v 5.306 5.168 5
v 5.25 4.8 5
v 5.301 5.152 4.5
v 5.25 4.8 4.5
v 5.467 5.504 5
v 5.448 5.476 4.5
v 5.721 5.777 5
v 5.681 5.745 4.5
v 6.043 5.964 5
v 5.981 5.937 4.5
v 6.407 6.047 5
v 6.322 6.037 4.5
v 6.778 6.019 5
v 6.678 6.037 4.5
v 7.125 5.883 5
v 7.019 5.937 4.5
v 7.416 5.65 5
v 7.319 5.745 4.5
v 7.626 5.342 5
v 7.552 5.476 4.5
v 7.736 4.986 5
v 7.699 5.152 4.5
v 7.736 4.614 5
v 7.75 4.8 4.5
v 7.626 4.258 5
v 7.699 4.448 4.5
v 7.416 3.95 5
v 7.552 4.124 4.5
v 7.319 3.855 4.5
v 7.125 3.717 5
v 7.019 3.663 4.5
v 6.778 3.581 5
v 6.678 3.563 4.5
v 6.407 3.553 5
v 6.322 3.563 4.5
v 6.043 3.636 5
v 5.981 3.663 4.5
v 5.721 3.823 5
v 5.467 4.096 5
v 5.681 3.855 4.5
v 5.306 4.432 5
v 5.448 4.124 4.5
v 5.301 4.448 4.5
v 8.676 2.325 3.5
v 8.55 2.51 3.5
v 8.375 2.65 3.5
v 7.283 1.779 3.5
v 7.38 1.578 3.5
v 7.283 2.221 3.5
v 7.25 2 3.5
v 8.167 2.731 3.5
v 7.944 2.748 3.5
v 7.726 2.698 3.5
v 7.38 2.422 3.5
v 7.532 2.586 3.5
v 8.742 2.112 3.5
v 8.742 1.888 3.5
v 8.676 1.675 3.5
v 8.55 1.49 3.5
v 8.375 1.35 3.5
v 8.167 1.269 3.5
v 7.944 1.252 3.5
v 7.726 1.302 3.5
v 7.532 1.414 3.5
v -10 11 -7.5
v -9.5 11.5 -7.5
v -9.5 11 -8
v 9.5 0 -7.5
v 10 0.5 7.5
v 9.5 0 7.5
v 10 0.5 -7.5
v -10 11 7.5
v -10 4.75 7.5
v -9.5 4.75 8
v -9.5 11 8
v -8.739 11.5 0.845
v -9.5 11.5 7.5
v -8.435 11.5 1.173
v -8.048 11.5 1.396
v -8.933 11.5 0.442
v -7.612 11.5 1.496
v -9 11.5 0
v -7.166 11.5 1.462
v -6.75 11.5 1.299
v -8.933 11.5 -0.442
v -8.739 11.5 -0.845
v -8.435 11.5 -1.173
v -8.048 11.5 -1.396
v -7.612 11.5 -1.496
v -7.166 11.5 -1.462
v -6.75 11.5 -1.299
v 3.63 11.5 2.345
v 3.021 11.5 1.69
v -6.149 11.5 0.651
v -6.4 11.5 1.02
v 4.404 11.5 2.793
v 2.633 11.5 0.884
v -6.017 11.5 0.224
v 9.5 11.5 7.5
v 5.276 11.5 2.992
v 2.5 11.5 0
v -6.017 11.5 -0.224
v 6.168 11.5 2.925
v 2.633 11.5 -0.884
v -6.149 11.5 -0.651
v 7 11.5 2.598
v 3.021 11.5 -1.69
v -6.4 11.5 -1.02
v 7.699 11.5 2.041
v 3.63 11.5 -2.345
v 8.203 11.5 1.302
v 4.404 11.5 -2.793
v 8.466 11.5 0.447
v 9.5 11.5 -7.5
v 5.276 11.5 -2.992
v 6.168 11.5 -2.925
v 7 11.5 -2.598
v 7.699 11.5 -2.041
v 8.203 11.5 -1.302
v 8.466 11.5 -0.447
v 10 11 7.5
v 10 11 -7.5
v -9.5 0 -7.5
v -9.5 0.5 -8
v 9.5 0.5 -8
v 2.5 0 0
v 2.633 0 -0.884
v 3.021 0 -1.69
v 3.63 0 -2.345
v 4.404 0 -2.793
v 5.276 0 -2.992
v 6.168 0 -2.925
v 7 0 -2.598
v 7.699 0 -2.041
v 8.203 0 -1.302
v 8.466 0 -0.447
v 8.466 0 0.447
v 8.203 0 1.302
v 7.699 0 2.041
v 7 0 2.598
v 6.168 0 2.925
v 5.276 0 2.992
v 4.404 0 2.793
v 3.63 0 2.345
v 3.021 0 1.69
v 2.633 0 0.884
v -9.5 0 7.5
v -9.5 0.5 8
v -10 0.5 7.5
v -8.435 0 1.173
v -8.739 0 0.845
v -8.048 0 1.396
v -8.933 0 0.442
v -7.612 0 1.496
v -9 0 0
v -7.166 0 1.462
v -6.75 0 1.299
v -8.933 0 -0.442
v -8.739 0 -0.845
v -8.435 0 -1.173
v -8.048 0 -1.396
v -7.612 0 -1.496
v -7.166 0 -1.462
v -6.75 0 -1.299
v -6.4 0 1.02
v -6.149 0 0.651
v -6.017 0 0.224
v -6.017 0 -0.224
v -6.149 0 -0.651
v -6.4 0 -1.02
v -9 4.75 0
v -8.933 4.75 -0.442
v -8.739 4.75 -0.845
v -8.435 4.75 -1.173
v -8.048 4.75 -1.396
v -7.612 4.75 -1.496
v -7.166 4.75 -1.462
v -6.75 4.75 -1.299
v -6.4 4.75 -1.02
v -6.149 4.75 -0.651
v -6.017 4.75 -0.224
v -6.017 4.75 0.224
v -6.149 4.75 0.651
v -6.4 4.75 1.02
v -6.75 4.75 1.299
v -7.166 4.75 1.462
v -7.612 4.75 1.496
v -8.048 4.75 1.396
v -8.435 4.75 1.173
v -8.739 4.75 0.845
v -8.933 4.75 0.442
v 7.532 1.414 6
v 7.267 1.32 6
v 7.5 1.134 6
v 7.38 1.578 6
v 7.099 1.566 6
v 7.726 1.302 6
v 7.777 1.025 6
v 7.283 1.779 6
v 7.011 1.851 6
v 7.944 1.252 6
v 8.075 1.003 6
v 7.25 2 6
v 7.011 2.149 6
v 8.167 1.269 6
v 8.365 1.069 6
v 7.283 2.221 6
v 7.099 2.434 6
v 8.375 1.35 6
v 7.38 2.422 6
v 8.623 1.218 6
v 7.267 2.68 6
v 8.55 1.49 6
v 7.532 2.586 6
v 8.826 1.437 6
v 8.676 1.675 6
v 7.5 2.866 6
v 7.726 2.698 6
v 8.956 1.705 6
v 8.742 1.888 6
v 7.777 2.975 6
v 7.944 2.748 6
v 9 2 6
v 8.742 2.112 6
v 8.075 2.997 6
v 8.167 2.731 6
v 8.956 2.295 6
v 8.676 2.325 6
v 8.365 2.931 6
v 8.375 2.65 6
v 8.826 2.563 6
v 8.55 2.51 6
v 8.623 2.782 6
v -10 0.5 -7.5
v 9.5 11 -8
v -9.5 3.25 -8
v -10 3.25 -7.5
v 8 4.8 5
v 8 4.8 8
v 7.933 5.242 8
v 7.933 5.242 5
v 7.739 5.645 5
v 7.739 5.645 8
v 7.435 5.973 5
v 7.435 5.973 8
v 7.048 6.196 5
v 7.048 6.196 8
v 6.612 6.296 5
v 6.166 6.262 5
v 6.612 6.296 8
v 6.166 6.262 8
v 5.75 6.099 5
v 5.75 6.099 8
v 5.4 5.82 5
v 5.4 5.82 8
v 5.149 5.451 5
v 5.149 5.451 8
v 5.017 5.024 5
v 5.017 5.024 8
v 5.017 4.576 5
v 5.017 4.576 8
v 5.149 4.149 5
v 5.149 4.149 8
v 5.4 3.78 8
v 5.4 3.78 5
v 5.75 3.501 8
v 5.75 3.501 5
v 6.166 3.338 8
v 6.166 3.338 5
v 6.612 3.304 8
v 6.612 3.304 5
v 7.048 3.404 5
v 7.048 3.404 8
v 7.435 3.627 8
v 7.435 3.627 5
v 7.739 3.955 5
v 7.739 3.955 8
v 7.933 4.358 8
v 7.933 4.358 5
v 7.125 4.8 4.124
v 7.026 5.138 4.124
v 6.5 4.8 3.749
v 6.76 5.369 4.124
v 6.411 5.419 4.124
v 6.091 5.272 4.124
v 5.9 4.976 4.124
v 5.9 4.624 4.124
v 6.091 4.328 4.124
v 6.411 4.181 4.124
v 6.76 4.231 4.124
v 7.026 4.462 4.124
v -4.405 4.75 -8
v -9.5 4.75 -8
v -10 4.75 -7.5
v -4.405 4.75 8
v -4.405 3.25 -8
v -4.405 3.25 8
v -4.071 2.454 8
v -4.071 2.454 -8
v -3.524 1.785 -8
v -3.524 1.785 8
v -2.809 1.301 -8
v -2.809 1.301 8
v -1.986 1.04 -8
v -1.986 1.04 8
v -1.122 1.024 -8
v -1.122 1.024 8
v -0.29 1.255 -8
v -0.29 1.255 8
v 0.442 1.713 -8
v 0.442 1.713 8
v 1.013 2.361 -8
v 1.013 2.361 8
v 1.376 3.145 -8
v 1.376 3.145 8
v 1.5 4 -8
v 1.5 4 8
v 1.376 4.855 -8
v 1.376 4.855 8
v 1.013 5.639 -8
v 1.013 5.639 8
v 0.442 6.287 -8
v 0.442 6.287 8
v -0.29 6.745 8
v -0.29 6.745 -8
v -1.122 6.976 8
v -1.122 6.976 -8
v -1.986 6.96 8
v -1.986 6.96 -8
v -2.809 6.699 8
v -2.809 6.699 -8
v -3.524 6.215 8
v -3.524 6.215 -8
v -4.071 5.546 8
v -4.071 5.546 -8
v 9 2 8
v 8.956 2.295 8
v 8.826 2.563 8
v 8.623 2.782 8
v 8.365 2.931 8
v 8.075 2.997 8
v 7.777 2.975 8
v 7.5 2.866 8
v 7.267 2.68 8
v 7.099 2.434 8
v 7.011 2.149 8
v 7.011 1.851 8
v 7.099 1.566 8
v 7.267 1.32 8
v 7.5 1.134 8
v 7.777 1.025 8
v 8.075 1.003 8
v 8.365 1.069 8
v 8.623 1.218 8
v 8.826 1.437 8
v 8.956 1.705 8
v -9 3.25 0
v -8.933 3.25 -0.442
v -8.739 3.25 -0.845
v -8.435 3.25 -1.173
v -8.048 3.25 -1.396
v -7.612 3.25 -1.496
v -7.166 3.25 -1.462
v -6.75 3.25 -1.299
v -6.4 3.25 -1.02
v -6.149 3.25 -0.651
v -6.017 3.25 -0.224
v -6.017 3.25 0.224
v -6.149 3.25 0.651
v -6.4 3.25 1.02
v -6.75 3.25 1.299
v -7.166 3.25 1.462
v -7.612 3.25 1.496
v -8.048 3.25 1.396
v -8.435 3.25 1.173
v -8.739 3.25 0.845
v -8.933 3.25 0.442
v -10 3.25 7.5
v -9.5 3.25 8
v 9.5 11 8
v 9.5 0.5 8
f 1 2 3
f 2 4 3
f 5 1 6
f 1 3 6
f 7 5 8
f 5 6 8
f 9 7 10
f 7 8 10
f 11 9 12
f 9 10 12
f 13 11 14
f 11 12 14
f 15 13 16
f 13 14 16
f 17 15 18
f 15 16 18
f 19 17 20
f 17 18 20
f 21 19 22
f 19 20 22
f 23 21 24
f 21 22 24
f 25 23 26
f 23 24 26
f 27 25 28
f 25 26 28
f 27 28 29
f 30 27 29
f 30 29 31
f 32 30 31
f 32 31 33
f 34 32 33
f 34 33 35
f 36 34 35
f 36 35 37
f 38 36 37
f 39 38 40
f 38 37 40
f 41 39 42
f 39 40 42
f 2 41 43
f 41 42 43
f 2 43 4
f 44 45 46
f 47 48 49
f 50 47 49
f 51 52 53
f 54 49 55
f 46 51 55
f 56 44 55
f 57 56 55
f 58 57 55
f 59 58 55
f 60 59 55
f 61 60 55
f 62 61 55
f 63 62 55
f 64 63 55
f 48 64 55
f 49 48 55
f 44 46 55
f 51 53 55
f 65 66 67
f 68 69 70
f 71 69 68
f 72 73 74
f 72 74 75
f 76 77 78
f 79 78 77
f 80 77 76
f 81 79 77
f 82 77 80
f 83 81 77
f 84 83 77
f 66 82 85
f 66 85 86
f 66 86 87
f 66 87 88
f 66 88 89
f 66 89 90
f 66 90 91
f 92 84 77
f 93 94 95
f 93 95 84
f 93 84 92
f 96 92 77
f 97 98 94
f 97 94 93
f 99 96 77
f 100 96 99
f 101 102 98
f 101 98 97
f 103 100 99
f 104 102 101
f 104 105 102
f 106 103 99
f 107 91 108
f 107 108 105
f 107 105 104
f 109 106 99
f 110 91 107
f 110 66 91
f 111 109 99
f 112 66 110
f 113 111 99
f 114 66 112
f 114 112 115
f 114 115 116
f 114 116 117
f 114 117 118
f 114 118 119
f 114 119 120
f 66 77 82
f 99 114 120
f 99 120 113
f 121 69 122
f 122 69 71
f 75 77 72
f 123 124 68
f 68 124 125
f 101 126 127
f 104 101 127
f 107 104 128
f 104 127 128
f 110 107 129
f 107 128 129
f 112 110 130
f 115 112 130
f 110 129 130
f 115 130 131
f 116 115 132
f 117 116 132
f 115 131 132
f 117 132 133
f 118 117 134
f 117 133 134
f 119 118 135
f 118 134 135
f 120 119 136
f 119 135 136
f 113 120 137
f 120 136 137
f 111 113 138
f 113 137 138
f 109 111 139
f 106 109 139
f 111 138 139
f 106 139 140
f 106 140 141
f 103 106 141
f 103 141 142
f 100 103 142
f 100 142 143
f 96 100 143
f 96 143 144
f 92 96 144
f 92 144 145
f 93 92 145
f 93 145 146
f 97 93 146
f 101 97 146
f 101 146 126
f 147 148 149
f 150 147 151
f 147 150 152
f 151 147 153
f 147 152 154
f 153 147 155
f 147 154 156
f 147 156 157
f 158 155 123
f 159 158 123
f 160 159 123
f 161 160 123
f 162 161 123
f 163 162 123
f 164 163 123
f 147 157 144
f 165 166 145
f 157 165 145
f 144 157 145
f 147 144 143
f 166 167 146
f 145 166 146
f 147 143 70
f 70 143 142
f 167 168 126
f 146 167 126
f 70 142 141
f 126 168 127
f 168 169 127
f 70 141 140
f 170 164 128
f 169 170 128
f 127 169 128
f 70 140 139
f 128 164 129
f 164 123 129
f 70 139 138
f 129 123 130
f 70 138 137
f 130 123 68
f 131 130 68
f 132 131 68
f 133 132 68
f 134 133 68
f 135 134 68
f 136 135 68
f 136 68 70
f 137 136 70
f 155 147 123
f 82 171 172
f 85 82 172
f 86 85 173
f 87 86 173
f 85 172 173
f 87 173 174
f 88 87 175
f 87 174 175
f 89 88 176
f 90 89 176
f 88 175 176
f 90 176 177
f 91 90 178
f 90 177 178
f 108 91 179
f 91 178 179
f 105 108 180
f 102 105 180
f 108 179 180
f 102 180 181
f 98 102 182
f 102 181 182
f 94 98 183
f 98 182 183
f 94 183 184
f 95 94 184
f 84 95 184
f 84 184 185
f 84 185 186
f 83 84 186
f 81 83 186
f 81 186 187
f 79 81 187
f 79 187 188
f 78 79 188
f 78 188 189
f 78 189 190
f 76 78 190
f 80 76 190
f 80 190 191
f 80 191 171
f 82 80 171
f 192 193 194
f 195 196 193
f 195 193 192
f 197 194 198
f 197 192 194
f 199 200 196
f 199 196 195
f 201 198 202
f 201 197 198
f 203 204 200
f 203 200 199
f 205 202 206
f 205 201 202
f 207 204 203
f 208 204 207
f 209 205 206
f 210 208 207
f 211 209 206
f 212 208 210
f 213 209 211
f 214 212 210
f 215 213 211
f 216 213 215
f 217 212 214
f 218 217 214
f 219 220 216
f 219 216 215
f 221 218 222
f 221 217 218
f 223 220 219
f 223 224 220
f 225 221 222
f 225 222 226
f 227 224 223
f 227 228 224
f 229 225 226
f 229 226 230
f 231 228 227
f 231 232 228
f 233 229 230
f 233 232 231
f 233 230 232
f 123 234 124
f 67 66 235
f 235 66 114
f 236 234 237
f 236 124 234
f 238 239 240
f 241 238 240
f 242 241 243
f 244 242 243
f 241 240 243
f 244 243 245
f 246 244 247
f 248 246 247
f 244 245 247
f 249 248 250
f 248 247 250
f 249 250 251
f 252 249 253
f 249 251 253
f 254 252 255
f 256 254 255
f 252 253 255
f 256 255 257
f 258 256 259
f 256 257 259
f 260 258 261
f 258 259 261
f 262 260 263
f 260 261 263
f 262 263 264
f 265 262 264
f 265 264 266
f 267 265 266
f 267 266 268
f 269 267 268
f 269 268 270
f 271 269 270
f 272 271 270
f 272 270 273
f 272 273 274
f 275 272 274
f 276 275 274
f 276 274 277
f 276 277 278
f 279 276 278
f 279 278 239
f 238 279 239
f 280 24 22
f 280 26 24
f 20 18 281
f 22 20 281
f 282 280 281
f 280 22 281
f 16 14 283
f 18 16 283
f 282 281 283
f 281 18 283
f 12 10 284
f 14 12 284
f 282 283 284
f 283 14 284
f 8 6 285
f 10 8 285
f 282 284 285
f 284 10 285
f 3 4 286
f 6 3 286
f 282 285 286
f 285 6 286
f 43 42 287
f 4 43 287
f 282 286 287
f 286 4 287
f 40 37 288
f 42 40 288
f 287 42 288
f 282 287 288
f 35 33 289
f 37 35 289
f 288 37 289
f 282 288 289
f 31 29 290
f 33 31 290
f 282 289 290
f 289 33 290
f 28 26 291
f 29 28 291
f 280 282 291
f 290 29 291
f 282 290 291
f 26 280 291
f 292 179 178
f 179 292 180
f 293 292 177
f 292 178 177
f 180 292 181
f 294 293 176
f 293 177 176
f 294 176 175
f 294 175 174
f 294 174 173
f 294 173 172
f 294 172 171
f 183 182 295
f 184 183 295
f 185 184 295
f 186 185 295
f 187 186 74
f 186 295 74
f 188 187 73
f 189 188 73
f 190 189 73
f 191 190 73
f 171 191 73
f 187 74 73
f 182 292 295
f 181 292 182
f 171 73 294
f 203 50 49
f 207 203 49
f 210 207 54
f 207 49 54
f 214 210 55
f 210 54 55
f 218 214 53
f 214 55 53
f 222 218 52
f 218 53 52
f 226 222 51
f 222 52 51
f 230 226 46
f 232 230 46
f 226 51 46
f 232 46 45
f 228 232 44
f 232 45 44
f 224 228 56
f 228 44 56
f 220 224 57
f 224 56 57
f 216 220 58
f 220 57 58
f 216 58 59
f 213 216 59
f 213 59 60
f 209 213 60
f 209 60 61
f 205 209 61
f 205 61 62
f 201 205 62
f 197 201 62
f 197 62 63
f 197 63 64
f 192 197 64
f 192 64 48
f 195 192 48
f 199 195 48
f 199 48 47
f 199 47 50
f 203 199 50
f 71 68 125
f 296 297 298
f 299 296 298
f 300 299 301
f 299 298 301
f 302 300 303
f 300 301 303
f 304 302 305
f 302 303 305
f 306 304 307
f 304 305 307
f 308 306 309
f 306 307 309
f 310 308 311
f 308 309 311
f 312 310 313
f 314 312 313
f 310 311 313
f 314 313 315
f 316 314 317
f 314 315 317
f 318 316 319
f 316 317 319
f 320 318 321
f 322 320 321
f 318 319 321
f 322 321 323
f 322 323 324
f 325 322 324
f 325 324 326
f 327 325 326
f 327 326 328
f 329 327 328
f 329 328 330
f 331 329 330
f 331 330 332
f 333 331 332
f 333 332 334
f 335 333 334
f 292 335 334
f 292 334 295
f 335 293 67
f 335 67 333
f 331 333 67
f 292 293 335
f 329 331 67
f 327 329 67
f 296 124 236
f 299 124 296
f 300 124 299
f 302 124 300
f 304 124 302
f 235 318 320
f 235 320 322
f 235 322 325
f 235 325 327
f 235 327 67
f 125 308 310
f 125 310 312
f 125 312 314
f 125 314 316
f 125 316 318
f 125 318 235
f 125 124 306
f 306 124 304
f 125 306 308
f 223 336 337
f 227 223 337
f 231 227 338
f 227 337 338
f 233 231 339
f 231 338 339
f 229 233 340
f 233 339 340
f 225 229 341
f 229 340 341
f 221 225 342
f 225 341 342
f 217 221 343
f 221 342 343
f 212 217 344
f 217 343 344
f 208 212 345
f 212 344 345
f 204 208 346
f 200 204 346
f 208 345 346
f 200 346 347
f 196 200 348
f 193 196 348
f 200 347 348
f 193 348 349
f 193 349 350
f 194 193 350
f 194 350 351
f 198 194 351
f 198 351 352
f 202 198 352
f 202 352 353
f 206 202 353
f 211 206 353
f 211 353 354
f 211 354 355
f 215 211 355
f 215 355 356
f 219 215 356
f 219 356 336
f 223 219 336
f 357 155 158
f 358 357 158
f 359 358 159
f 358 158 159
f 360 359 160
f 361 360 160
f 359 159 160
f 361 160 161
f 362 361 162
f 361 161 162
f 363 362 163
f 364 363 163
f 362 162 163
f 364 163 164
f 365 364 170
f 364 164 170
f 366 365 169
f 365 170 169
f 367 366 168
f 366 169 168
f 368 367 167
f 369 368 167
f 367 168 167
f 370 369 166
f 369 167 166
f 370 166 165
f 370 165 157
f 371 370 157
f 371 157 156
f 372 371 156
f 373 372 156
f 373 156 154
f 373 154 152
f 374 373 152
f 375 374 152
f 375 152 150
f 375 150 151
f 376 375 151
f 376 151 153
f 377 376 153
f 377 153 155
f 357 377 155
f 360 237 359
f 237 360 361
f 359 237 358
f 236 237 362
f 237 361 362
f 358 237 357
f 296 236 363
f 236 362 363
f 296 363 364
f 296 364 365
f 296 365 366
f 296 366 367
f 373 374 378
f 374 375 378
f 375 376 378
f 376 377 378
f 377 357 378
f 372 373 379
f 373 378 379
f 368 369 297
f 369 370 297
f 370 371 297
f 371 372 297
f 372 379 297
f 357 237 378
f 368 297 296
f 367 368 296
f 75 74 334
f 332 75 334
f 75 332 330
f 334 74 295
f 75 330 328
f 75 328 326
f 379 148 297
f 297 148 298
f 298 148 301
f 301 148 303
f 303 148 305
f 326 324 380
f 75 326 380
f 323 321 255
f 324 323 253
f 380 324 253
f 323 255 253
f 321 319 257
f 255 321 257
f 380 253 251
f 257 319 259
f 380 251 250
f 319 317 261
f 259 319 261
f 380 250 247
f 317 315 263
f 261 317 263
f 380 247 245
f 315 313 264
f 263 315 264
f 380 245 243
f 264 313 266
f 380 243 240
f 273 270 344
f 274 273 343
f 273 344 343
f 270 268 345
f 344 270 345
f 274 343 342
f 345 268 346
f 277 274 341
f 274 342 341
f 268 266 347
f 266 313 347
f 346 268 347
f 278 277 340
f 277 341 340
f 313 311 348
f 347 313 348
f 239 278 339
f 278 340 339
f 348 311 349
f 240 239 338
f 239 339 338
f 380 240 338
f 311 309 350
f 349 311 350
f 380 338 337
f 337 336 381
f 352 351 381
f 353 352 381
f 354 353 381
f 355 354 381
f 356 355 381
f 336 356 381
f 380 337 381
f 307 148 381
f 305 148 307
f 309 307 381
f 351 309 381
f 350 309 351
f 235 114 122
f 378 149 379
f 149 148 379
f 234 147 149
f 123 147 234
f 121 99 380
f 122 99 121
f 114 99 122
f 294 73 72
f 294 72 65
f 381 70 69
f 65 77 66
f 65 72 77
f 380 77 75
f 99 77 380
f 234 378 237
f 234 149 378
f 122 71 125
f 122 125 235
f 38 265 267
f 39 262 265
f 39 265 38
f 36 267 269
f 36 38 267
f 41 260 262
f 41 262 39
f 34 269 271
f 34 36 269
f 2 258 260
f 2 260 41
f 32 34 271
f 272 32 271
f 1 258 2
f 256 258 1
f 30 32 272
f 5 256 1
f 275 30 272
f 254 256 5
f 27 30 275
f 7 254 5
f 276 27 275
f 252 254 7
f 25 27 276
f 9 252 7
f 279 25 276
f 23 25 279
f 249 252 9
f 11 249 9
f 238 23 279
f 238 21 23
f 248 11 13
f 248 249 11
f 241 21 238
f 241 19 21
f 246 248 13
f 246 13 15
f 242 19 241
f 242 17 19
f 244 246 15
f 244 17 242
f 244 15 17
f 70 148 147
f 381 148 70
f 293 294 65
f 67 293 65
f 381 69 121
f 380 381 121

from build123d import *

# Parameters (mm, degrees)
SKETCH1_W                   = 20
SKETCH1_H                   = 16
BOSS_EXTRUDE1_DEPTH         = 11.5
CUT_EXTRUDE1_DEPTH          = 23.096379794
M3_TAPPED_HOLE1_D           = 2.5
M3_TAPPED_HOLE1_DEPTH       = 3.5
M3_TAPPED_HOLE1_CBORE_D     = 3
M3_TAPPED_HOLE1_CBORE_DEPTH = 3
M3_TAPPED_HOLE1_TIP         = 0.751075774
HOLE1_D                     = 1.5
HOLE1_DEPTH                 = 4.5
HOLE1_CBORE_D               = 2
HOLE1_CBORE_DEPTH           = 2
M6_TAPPED_HOLE1_D           = 6
M3_TAPPED_HOLE2_D           = 3
CHAMFER1_SIZE               = 0.5


with BuildPart() as part:
    # Sketch1 → Boss-Extrude1 (new body)
    with BuildSketch(Plane(origin=(0, 0, 0), x_dir=(1, 0, 0), z_dir=(0, 1, 0))):
        Rectangle(SKETCH1_W, SKETCH1_H)
    extrude(amount=BOSS_EXTRUDE1_DEPTH)

    # Sketch2 → Cut-Extrude1 (cut, through all)
    with BuildSketch(Plane.XY.offset(8)):
        with BuildLine():
            Line((-4.40473751, 4.75), (-10, 4.75))
            Line((-10, 4.75), (-10, 4))
            Line((-10, 4), (-10, 3.25))
            Line((-10, 3.25), (-4.40473751, 3.25))
            ThreePointArc((-4.40473751, 3.25), (1.5, 4), (-4.40473751, 4.75))
        make_face()
    extrude(amount=-CUT_EXTRUDE1_DEPTH, mode=Mode.SUBTRACT)

    # M3 Tapped Hole1
    with Locations(Plane.XY.offset(8)):
        with Locations((6.5, 4.8)):
            CounterBoreHole(M3_TAPPED_HOLE1_D / 2, M3_TAPPED_HOLE1_CBORE_D / 2, M3_TAPPED_HOLE1_CBORE_DEPTH, depth=M3_TAPPED_HOLE1_DEPTH)
            with Locations((0, 0, -(M3_TAPPED_HOLE1_DEPTH + M3_TAPPED_HOLE1_TIP / 2))):  # 118° drill point
                Cone(0, M3_TAPPED_HOLE1_D / 2, M3_TAPPED_HOLE1_TIP, mode=Mode.SUBTRACT)

    # Hole1
    with Locations(Plane.XY.offset(8)):
        with Locations((8, 2)):
            CounterBoreHole(HOLE1_D / 2, HOLE1_CBORE_D / 2, HOLE1_CBORE_DEPTH, depth=HOLE1_DEPTH)

    # M6 Tapped Hole1 (through all)
    with Locations(Plane(origin=(0, 11.5, 0), x_dir=(1, 0, 0), z_dir=(0, 1, 0))):
        with Locations((5.5, 0)):
            Hole(M6_TAPPED_HOLE1_D / 2)

    # M3 Tapped Hole2 (through all)
    with Locations(Plane(origin=(0, 11.5, 0), x_dir=(1, 0, 0), z_dir=(0, 1, 0))):
        with Locations((-7.5, 0)):
            Hole(M3_TAPPED_HOLE2_D / 2)

    # Chamfer1
    chamfer1_edges = [part.edges().sort_by_distance(p)[0] for p in [
        (-10, 11.5, 0),
        (0, 11.5, 8),
        (-10, 1.625, 8),
        (-10, 1.625, -8),
        (10, 11.5, 0),
        (0, 0, 8),
        (-10, 0, 0),
        (0, 0, -8),
        (10, 0, 0),
        (0, 11.5, -8),
        (10, 5.75, 8),
        (-10, 8.125, 8),
        (-10, 8.125, -8),
        (10, 5.75, -8),
    ]]
    chamfer(chamfer1_edges, length=CHAMFER1_SIZE)


solid = part.part
